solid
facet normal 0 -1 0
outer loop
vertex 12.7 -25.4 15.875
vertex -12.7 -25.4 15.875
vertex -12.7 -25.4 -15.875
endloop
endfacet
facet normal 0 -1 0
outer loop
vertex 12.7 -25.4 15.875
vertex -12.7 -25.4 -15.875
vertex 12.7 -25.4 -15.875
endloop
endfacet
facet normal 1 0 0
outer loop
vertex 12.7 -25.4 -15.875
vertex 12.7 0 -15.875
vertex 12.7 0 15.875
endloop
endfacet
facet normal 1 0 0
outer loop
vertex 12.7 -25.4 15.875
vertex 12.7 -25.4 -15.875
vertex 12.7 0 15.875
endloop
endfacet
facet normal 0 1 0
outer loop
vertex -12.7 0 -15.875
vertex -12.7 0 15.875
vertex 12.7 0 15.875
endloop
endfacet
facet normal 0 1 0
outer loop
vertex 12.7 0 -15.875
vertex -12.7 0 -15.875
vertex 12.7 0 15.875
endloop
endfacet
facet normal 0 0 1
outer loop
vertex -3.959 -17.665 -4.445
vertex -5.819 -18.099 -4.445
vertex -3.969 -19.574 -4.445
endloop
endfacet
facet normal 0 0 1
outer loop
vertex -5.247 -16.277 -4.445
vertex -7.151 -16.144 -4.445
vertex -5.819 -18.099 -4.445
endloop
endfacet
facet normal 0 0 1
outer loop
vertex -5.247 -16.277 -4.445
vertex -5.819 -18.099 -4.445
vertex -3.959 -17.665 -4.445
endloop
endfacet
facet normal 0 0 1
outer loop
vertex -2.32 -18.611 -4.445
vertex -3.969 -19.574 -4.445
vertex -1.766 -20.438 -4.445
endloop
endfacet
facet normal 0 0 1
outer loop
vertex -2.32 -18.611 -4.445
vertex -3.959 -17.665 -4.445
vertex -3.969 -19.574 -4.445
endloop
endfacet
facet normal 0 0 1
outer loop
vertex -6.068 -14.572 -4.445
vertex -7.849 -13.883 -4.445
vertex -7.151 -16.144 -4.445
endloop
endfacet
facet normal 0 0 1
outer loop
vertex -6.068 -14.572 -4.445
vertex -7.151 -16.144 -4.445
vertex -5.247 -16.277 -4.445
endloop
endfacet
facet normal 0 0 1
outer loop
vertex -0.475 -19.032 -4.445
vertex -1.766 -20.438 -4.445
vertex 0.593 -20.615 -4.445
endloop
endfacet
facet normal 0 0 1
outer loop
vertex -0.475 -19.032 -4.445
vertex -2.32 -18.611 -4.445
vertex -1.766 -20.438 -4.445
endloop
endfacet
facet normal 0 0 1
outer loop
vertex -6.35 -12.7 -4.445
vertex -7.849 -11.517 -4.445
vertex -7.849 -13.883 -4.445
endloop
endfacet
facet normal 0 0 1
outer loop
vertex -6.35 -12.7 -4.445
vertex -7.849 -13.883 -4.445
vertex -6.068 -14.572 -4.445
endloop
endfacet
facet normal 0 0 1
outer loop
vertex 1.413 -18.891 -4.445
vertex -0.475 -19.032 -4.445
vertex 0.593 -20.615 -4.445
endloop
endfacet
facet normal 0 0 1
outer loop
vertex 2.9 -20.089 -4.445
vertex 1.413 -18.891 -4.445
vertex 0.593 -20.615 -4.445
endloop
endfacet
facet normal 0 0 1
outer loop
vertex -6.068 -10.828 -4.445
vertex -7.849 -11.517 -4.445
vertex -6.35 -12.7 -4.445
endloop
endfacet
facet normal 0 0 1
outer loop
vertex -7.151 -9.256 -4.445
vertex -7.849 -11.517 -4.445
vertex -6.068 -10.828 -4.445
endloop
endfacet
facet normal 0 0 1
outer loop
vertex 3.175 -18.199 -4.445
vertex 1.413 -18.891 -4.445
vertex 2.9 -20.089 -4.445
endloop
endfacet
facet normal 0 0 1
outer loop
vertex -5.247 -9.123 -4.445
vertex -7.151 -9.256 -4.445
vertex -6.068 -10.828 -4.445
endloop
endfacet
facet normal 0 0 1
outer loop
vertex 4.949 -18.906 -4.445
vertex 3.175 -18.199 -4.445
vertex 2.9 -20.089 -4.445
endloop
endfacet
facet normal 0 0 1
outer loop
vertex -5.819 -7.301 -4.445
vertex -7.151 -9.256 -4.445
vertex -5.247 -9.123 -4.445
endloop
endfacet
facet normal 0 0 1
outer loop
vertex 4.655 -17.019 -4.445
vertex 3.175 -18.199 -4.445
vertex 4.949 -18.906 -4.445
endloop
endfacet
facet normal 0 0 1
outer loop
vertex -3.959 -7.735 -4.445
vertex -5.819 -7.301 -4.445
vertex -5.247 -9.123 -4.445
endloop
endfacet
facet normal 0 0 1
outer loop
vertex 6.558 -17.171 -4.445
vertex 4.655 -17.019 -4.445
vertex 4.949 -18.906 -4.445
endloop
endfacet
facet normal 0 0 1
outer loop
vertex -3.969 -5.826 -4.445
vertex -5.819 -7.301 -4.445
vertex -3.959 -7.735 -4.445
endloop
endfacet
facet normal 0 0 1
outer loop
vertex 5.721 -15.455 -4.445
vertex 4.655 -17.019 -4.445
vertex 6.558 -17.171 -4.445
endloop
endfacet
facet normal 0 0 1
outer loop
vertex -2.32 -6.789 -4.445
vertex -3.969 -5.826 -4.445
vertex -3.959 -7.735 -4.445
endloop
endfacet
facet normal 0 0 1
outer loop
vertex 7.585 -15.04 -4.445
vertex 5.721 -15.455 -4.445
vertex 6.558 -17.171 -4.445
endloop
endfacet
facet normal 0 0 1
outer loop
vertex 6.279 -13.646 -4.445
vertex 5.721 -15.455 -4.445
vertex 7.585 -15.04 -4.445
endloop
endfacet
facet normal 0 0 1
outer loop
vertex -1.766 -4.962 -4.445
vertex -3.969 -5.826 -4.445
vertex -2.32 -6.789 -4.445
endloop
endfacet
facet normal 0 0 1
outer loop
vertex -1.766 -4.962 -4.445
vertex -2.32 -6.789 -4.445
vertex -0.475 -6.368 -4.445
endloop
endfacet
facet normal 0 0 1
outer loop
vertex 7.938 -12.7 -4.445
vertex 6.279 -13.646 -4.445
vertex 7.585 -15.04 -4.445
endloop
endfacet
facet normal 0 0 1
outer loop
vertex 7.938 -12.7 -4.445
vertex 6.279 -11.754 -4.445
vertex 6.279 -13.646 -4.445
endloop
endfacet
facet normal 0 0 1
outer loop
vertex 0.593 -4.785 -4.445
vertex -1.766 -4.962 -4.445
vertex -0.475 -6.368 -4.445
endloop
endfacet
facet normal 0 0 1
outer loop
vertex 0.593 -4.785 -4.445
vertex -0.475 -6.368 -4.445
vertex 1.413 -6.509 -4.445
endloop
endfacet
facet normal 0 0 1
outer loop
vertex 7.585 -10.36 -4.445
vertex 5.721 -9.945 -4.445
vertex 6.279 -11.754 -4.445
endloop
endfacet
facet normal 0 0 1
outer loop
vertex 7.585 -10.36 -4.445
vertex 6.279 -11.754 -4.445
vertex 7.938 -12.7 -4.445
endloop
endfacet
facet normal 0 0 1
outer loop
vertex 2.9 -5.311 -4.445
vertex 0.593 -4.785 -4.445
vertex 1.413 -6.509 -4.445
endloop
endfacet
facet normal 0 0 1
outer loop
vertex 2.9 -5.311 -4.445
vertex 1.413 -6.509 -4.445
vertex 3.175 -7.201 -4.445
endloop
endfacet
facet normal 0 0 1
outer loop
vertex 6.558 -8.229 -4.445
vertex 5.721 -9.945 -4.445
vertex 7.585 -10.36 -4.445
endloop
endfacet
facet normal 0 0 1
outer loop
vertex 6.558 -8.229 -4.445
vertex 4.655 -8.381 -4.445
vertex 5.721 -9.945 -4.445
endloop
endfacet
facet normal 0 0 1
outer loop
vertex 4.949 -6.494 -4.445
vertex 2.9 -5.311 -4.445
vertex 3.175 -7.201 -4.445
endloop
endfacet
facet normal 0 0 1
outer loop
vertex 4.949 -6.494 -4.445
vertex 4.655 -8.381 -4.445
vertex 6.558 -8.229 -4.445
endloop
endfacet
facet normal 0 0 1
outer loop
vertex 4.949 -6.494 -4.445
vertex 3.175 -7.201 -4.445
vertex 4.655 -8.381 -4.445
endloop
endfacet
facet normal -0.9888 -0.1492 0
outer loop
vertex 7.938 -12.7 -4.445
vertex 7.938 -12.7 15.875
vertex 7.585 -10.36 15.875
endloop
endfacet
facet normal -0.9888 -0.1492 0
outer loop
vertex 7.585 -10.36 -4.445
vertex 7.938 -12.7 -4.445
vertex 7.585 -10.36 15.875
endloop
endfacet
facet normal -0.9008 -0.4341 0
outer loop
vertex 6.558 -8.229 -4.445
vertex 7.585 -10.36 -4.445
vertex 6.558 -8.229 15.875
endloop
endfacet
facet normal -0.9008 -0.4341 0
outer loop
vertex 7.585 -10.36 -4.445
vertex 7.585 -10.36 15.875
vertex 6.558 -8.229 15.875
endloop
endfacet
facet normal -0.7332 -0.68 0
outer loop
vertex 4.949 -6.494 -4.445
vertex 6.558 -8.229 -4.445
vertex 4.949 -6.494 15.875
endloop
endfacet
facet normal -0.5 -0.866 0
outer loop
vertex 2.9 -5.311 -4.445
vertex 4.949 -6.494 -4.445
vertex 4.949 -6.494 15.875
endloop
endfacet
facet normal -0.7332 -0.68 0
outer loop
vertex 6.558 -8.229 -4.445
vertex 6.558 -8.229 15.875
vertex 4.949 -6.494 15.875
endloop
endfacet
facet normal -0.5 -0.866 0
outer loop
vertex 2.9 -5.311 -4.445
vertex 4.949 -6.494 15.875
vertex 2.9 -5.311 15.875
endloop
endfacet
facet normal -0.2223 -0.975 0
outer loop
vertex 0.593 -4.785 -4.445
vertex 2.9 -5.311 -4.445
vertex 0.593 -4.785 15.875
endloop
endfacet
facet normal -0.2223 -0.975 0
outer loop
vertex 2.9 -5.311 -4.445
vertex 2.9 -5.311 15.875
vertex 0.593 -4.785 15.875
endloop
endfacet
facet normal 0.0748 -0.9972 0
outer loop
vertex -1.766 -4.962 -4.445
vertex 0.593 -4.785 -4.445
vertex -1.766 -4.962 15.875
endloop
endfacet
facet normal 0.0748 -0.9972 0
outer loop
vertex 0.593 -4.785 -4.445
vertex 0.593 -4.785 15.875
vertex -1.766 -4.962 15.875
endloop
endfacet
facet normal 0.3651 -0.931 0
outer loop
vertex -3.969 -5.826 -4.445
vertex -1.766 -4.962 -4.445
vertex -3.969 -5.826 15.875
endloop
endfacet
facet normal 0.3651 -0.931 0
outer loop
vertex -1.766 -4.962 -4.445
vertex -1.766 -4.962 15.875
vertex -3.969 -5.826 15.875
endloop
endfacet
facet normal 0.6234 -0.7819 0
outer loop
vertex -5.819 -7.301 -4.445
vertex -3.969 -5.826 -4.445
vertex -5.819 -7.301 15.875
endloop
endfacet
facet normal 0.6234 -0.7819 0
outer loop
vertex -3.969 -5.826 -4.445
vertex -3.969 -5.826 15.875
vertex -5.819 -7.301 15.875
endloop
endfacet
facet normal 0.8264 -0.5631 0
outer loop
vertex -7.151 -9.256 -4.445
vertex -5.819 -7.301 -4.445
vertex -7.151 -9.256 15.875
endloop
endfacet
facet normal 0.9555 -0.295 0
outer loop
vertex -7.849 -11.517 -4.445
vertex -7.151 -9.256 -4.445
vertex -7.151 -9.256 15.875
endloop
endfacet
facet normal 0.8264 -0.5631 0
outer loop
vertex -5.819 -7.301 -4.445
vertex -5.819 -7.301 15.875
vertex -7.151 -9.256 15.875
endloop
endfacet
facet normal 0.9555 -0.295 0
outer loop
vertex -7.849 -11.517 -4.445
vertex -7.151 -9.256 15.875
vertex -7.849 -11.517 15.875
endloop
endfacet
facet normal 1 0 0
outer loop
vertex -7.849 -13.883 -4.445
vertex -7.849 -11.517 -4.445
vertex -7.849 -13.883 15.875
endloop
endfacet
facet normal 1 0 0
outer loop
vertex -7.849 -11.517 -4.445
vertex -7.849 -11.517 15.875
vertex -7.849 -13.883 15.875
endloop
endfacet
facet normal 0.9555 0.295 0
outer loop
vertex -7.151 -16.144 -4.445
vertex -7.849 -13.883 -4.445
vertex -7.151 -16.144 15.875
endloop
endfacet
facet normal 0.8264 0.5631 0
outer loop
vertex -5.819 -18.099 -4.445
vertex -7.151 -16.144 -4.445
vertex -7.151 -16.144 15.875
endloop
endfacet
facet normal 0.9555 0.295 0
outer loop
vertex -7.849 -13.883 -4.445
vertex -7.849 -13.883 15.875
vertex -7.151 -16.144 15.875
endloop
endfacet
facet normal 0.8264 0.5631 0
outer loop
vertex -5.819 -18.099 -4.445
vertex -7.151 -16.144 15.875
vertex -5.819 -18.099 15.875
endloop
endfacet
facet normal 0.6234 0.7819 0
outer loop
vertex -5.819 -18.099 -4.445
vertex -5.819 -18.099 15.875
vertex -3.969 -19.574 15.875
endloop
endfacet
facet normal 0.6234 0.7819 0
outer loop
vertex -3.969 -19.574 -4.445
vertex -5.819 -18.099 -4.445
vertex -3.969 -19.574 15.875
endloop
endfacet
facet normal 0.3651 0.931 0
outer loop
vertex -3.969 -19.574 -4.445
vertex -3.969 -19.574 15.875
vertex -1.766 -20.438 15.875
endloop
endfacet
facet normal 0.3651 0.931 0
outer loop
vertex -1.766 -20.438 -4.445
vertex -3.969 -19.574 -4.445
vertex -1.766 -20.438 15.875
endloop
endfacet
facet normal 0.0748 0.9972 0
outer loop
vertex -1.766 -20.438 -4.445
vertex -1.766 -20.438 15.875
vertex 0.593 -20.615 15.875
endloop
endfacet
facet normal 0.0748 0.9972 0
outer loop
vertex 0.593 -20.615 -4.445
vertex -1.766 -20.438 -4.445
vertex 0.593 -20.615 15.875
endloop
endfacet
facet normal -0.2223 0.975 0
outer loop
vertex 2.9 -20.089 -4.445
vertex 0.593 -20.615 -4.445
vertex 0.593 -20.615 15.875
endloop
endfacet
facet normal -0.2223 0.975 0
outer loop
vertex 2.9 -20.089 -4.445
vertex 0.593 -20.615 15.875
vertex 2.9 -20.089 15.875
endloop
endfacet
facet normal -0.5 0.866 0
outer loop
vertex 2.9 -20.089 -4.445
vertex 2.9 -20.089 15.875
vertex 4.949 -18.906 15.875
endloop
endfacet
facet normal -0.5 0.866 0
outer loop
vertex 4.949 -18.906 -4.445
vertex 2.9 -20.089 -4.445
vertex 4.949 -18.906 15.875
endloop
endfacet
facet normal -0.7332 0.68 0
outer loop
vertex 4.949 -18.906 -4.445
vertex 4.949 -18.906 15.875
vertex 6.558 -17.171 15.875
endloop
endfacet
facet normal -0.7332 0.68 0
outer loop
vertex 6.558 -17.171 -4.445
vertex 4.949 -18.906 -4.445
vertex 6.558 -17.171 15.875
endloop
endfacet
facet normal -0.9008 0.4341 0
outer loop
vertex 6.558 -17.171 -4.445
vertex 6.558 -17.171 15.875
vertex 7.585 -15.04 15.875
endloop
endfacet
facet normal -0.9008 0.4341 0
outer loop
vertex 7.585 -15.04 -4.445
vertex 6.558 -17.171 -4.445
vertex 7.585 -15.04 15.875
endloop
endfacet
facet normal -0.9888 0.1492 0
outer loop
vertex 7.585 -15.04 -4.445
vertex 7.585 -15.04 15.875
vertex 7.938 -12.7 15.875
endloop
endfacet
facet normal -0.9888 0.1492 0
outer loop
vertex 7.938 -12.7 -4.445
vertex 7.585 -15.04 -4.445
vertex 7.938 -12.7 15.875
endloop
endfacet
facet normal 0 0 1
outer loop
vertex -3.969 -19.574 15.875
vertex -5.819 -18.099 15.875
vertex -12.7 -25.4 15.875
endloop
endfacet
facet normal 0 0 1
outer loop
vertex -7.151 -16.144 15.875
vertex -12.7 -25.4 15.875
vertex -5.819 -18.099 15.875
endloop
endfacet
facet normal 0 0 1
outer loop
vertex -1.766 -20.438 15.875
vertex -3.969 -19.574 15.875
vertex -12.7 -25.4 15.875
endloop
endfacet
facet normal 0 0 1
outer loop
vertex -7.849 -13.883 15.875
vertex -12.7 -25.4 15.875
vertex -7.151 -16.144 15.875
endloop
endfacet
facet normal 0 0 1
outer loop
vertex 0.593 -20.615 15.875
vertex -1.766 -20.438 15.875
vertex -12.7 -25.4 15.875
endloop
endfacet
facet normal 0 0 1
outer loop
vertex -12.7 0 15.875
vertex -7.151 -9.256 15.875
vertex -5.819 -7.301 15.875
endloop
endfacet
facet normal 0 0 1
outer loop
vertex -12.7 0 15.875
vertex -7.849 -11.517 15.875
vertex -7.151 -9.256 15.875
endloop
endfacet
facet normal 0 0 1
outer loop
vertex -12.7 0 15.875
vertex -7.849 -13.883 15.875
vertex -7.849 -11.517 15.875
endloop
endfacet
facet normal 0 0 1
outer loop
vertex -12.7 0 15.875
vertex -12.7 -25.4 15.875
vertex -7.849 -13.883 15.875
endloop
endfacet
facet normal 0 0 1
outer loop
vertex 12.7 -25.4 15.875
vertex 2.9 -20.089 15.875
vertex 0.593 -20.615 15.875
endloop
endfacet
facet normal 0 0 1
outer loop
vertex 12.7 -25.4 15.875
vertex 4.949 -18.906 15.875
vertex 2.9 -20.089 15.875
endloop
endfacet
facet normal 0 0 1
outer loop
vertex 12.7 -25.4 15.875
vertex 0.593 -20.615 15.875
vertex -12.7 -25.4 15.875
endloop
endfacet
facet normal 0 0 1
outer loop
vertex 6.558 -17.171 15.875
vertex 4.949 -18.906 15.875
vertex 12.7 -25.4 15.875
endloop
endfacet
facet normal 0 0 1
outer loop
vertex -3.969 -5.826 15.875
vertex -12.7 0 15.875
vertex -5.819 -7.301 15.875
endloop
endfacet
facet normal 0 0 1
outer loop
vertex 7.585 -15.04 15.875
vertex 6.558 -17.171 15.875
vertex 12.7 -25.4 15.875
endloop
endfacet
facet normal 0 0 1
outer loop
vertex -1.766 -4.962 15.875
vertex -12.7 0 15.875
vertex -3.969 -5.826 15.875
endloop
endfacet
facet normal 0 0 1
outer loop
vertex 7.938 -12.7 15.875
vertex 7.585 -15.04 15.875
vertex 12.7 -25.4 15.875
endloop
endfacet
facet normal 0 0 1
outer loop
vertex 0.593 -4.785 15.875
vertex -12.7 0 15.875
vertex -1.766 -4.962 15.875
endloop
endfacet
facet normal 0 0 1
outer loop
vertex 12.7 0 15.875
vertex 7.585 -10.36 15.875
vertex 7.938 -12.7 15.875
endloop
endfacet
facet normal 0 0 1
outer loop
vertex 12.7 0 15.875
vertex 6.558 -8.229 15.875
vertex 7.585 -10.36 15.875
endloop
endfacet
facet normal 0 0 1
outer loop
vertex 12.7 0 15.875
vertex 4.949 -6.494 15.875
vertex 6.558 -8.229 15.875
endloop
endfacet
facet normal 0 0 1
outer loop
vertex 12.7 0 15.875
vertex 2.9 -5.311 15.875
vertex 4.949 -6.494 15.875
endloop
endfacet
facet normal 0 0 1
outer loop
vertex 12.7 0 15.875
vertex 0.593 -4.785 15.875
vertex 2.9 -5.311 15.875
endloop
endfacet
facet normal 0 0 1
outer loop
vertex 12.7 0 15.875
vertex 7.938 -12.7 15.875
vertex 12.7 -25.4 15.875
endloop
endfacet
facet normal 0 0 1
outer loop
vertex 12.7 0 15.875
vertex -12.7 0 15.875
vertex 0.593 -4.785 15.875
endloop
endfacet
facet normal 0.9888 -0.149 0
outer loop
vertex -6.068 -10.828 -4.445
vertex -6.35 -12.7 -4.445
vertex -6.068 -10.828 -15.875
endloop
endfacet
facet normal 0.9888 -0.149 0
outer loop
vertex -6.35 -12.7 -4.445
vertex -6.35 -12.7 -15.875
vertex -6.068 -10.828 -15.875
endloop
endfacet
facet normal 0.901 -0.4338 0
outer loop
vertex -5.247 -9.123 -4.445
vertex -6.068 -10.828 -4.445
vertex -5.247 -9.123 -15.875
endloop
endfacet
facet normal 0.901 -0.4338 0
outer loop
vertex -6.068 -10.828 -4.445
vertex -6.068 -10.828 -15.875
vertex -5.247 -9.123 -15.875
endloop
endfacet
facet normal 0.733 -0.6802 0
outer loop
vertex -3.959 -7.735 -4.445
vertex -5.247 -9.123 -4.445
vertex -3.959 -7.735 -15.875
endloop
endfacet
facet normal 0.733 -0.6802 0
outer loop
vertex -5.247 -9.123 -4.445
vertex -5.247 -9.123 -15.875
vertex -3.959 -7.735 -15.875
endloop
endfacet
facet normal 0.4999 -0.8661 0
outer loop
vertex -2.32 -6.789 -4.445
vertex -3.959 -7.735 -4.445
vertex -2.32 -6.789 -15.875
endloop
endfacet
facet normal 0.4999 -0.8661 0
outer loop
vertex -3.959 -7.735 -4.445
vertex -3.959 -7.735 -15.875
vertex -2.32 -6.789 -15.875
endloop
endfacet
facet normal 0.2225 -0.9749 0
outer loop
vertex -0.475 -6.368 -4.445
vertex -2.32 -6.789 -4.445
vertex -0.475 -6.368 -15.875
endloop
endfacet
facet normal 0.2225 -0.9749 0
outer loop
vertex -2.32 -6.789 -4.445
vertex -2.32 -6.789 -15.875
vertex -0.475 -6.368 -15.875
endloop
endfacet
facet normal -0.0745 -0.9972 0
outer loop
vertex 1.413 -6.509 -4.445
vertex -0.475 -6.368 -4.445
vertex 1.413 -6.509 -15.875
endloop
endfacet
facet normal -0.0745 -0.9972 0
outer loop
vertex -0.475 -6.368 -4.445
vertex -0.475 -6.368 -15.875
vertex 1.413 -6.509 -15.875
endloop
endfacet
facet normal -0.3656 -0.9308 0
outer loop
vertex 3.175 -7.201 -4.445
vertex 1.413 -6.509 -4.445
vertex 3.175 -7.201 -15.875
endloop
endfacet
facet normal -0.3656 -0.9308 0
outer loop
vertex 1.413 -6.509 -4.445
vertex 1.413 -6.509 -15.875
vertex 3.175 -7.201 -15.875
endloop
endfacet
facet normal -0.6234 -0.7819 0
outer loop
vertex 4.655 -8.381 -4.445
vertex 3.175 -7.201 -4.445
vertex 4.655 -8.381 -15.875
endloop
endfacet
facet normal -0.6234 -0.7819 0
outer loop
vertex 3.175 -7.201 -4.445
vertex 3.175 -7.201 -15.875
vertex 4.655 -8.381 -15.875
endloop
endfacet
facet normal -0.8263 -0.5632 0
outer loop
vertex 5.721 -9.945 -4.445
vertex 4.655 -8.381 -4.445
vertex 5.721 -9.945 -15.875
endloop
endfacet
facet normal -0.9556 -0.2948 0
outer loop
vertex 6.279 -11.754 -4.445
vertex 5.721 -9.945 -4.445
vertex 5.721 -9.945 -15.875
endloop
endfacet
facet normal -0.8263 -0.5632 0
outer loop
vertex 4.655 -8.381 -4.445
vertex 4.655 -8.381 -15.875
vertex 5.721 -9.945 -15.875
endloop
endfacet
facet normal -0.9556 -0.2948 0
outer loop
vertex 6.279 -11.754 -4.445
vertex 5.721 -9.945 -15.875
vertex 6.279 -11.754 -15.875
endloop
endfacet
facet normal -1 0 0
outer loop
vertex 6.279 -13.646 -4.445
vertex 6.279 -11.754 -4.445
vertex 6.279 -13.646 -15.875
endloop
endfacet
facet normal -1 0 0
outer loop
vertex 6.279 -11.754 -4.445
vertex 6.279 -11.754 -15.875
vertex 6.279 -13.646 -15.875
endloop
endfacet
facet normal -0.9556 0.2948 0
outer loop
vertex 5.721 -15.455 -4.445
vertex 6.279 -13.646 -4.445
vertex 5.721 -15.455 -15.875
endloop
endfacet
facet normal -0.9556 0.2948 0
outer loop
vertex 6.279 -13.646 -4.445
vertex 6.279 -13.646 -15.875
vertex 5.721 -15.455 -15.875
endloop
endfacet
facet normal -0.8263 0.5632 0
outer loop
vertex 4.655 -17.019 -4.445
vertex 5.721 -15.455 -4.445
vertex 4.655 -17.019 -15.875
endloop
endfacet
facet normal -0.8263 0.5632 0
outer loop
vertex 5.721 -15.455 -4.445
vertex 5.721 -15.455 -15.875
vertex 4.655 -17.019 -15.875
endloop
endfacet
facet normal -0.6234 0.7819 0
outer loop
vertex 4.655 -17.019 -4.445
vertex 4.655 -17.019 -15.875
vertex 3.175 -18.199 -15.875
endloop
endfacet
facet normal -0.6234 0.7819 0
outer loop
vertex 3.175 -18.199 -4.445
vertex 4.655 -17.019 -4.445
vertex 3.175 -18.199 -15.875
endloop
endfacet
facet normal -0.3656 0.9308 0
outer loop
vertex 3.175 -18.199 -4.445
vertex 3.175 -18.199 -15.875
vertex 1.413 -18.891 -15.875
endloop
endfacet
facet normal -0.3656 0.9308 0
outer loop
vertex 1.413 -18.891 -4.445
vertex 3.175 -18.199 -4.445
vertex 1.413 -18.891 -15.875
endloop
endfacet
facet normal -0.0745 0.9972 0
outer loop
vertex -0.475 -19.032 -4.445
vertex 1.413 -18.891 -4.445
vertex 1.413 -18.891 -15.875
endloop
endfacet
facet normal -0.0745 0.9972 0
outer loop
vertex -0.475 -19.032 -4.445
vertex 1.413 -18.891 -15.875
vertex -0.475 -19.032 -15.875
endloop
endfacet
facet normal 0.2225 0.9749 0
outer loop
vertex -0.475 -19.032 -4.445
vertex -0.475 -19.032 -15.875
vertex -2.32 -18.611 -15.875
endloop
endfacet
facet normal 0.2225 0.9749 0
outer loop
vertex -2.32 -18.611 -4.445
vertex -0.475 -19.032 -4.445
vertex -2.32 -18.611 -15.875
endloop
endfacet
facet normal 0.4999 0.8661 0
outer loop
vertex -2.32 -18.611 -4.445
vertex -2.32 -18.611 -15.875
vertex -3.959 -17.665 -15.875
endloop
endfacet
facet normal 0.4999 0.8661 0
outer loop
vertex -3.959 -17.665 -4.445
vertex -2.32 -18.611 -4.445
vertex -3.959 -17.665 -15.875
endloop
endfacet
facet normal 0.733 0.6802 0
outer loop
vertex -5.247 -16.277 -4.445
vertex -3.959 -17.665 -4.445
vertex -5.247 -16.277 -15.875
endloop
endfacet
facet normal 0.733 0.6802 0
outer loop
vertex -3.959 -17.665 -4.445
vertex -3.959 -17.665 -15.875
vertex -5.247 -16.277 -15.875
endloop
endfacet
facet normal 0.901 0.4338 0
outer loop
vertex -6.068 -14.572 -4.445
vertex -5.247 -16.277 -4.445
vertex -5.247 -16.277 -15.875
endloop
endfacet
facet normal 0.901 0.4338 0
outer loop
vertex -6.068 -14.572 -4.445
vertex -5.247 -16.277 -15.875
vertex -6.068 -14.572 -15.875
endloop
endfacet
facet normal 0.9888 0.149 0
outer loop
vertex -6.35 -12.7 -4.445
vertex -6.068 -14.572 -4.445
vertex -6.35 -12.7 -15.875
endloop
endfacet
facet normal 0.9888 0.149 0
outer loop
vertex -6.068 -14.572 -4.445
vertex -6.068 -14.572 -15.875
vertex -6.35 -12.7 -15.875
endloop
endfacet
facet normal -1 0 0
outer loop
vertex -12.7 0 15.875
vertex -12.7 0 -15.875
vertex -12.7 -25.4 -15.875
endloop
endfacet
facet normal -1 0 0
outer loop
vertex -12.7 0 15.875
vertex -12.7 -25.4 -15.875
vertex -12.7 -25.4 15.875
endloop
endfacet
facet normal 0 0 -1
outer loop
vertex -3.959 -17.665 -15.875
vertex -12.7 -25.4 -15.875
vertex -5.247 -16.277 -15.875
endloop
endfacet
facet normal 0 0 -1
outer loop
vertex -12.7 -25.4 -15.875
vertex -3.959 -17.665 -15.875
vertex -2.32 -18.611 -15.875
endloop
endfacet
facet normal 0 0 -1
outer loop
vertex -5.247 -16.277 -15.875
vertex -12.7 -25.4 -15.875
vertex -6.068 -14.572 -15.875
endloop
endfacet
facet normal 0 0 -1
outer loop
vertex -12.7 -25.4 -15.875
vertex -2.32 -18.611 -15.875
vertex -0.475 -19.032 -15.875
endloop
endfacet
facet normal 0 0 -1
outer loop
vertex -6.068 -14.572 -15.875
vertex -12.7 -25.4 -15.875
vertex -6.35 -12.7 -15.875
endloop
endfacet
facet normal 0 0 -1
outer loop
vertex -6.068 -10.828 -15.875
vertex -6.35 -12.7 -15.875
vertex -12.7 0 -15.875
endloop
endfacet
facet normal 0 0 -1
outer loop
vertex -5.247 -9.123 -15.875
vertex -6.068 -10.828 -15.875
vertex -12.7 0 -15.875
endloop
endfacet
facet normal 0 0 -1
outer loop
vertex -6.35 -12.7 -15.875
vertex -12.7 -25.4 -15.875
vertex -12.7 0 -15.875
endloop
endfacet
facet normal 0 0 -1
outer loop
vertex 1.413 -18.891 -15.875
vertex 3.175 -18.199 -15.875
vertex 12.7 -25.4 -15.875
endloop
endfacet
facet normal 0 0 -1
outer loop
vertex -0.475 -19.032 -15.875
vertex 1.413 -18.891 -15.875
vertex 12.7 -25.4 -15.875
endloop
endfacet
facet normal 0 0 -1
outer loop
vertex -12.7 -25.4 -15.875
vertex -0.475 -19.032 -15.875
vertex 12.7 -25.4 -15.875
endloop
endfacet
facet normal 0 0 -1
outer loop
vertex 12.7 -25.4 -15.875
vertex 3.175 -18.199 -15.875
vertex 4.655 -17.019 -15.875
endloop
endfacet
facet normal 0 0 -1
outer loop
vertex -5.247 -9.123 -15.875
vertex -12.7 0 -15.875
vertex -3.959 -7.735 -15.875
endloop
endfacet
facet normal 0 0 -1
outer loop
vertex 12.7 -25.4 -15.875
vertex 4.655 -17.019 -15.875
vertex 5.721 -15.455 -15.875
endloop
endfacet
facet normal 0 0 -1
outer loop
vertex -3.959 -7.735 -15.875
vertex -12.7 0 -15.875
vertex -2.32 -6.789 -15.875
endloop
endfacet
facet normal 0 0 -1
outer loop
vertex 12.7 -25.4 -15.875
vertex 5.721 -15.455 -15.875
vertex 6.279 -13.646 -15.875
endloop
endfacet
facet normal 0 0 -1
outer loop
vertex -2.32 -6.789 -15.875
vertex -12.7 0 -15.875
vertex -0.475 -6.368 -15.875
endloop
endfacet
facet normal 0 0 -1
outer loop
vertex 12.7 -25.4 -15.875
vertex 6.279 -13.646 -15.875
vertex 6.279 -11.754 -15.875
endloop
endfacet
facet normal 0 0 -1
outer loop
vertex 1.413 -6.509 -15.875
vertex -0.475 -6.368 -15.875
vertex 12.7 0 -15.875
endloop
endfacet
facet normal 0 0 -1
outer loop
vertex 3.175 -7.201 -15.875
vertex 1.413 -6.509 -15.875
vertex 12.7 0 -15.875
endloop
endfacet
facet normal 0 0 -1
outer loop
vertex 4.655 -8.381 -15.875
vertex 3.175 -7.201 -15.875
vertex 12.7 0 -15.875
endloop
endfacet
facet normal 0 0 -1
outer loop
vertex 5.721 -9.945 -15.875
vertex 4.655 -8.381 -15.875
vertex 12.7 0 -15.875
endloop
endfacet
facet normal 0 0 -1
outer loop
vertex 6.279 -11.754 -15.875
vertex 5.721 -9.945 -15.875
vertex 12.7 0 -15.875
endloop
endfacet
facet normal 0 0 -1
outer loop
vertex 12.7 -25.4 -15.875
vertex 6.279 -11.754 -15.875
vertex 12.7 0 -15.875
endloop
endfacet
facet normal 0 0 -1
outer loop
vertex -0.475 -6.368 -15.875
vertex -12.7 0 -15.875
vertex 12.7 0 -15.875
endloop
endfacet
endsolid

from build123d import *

# Parameters (mm, degrees)
F0_W           = 25.4
F0_H           = 31.75
F1_DEPTH       = 25.4
F3_D           = 12.7
F3_CBORE_D     = 15.875
F3_CBORE_DEPTH = 20.32


with BuildPart() as f1:
    # F0 (on Front) → F1 (new body)
    with BuildSketch(Plane.XZ):
        Rectangle(F0_W, F0_H)
    extrude(amount=F1_DEPTH)

    # F3 (through all)
    with Locations(Plane.XY.offset(15.875)):
        with Locations((0, -12.7)):
            CounterBoreHole(F3_D / 2, F3_CBORE_D / 2, F3_CBORE_DEPTH)


solid = f1.part
